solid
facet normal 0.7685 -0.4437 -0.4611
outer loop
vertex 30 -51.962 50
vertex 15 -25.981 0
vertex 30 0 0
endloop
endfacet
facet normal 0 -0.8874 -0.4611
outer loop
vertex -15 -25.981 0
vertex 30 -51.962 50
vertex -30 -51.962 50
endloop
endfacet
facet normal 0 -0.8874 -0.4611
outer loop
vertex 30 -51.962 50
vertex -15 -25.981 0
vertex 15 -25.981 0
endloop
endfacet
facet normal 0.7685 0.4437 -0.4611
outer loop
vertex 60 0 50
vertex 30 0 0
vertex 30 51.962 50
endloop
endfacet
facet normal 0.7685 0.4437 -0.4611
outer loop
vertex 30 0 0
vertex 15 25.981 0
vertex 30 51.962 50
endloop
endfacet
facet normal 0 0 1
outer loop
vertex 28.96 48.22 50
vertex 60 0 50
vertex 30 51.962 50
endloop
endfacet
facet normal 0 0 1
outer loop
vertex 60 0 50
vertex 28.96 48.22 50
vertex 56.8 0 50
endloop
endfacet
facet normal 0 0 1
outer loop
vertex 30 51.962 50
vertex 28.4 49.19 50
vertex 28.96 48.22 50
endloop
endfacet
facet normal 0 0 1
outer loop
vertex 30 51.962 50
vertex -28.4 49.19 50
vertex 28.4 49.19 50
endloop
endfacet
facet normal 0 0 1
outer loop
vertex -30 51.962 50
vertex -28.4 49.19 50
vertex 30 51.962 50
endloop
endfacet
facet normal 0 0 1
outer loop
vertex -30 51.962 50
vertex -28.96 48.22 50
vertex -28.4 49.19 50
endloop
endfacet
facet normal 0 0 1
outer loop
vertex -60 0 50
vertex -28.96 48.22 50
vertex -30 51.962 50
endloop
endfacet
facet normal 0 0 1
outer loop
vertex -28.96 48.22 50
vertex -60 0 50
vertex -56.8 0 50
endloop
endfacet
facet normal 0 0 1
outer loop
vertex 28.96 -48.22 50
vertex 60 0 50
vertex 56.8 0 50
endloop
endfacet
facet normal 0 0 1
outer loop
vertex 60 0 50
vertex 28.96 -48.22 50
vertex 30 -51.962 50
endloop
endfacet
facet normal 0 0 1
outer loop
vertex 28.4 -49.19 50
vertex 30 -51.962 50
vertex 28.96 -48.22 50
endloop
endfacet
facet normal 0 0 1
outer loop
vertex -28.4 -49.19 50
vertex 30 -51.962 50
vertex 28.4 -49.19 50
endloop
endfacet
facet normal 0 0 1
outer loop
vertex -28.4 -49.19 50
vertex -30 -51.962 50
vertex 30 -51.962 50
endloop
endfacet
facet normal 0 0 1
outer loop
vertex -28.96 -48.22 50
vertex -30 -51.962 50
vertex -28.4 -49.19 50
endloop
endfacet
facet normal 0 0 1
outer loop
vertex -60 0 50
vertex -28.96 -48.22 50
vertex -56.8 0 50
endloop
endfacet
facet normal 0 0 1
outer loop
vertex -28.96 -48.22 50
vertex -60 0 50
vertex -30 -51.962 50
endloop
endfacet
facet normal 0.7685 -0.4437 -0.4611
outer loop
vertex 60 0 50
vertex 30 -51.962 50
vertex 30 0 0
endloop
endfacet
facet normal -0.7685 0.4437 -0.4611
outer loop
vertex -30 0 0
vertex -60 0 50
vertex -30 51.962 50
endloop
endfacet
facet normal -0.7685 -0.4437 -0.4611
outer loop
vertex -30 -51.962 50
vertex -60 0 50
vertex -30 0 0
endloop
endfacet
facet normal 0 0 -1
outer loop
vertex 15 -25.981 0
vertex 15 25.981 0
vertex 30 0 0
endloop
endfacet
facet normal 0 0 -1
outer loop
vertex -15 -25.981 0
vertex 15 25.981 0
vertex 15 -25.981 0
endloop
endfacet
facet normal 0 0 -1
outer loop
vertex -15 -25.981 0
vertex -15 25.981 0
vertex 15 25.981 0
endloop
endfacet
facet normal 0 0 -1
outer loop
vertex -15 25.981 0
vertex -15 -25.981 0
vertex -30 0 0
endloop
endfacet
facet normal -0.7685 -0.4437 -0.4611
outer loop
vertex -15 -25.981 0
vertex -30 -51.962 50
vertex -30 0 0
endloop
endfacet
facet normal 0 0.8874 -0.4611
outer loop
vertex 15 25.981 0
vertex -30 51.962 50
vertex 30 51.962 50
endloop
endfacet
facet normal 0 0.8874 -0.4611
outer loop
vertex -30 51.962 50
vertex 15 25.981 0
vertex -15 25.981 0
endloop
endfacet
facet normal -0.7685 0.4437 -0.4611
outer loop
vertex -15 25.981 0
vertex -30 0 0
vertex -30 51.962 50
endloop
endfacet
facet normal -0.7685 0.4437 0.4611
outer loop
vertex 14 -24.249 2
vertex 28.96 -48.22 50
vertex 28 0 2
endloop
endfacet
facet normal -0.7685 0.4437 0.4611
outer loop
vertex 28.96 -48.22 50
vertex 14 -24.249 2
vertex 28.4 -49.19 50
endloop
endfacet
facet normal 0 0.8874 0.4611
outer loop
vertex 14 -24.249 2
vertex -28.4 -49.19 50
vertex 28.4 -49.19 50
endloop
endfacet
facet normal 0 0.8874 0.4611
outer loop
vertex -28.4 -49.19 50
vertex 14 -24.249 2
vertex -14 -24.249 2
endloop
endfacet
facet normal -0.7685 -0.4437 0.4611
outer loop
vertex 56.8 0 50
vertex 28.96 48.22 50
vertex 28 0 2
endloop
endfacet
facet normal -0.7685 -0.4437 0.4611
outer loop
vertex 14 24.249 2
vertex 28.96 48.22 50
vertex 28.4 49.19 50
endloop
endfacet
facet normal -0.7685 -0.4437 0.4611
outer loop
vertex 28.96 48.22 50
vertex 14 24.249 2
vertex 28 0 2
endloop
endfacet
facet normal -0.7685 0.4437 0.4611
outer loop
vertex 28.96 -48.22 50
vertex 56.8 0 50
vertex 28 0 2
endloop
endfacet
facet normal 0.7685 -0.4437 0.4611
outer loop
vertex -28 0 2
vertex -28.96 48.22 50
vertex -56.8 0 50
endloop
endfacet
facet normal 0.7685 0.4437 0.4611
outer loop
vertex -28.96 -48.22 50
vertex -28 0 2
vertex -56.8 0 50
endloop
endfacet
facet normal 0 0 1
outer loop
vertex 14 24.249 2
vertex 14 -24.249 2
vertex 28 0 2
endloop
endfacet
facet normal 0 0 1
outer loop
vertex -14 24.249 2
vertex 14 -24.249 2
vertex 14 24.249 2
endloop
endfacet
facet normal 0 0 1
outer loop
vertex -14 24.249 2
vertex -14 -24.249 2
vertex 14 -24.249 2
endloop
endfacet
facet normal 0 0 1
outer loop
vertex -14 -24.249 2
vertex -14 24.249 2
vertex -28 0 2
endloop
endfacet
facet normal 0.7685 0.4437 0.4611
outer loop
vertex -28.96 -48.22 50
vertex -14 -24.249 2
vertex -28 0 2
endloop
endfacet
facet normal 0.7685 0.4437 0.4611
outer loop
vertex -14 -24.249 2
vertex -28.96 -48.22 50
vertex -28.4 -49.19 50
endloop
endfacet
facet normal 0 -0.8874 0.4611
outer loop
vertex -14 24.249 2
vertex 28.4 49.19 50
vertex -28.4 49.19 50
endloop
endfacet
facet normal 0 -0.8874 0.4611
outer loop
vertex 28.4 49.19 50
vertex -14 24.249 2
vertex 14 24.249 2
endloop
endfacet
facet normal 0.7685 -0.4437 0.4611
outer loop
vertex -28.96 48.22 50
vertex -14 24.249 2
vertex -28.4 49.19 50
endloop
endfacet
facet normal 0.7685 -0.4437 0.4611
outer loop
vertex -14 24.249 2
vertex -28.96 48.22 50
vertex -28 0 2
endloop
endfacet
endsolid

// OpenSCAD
h = 50;
d1 = 60;
d2 = 120;
padding = 2;

difference() {
    cylinder(h=h, d1=d1, d2=d2, $fn=6);
    translate([0, 0, padding]) cylinder(h=h, d1=d1 - padding*2, d2=d2 - padding*2, $fn=6);
}
